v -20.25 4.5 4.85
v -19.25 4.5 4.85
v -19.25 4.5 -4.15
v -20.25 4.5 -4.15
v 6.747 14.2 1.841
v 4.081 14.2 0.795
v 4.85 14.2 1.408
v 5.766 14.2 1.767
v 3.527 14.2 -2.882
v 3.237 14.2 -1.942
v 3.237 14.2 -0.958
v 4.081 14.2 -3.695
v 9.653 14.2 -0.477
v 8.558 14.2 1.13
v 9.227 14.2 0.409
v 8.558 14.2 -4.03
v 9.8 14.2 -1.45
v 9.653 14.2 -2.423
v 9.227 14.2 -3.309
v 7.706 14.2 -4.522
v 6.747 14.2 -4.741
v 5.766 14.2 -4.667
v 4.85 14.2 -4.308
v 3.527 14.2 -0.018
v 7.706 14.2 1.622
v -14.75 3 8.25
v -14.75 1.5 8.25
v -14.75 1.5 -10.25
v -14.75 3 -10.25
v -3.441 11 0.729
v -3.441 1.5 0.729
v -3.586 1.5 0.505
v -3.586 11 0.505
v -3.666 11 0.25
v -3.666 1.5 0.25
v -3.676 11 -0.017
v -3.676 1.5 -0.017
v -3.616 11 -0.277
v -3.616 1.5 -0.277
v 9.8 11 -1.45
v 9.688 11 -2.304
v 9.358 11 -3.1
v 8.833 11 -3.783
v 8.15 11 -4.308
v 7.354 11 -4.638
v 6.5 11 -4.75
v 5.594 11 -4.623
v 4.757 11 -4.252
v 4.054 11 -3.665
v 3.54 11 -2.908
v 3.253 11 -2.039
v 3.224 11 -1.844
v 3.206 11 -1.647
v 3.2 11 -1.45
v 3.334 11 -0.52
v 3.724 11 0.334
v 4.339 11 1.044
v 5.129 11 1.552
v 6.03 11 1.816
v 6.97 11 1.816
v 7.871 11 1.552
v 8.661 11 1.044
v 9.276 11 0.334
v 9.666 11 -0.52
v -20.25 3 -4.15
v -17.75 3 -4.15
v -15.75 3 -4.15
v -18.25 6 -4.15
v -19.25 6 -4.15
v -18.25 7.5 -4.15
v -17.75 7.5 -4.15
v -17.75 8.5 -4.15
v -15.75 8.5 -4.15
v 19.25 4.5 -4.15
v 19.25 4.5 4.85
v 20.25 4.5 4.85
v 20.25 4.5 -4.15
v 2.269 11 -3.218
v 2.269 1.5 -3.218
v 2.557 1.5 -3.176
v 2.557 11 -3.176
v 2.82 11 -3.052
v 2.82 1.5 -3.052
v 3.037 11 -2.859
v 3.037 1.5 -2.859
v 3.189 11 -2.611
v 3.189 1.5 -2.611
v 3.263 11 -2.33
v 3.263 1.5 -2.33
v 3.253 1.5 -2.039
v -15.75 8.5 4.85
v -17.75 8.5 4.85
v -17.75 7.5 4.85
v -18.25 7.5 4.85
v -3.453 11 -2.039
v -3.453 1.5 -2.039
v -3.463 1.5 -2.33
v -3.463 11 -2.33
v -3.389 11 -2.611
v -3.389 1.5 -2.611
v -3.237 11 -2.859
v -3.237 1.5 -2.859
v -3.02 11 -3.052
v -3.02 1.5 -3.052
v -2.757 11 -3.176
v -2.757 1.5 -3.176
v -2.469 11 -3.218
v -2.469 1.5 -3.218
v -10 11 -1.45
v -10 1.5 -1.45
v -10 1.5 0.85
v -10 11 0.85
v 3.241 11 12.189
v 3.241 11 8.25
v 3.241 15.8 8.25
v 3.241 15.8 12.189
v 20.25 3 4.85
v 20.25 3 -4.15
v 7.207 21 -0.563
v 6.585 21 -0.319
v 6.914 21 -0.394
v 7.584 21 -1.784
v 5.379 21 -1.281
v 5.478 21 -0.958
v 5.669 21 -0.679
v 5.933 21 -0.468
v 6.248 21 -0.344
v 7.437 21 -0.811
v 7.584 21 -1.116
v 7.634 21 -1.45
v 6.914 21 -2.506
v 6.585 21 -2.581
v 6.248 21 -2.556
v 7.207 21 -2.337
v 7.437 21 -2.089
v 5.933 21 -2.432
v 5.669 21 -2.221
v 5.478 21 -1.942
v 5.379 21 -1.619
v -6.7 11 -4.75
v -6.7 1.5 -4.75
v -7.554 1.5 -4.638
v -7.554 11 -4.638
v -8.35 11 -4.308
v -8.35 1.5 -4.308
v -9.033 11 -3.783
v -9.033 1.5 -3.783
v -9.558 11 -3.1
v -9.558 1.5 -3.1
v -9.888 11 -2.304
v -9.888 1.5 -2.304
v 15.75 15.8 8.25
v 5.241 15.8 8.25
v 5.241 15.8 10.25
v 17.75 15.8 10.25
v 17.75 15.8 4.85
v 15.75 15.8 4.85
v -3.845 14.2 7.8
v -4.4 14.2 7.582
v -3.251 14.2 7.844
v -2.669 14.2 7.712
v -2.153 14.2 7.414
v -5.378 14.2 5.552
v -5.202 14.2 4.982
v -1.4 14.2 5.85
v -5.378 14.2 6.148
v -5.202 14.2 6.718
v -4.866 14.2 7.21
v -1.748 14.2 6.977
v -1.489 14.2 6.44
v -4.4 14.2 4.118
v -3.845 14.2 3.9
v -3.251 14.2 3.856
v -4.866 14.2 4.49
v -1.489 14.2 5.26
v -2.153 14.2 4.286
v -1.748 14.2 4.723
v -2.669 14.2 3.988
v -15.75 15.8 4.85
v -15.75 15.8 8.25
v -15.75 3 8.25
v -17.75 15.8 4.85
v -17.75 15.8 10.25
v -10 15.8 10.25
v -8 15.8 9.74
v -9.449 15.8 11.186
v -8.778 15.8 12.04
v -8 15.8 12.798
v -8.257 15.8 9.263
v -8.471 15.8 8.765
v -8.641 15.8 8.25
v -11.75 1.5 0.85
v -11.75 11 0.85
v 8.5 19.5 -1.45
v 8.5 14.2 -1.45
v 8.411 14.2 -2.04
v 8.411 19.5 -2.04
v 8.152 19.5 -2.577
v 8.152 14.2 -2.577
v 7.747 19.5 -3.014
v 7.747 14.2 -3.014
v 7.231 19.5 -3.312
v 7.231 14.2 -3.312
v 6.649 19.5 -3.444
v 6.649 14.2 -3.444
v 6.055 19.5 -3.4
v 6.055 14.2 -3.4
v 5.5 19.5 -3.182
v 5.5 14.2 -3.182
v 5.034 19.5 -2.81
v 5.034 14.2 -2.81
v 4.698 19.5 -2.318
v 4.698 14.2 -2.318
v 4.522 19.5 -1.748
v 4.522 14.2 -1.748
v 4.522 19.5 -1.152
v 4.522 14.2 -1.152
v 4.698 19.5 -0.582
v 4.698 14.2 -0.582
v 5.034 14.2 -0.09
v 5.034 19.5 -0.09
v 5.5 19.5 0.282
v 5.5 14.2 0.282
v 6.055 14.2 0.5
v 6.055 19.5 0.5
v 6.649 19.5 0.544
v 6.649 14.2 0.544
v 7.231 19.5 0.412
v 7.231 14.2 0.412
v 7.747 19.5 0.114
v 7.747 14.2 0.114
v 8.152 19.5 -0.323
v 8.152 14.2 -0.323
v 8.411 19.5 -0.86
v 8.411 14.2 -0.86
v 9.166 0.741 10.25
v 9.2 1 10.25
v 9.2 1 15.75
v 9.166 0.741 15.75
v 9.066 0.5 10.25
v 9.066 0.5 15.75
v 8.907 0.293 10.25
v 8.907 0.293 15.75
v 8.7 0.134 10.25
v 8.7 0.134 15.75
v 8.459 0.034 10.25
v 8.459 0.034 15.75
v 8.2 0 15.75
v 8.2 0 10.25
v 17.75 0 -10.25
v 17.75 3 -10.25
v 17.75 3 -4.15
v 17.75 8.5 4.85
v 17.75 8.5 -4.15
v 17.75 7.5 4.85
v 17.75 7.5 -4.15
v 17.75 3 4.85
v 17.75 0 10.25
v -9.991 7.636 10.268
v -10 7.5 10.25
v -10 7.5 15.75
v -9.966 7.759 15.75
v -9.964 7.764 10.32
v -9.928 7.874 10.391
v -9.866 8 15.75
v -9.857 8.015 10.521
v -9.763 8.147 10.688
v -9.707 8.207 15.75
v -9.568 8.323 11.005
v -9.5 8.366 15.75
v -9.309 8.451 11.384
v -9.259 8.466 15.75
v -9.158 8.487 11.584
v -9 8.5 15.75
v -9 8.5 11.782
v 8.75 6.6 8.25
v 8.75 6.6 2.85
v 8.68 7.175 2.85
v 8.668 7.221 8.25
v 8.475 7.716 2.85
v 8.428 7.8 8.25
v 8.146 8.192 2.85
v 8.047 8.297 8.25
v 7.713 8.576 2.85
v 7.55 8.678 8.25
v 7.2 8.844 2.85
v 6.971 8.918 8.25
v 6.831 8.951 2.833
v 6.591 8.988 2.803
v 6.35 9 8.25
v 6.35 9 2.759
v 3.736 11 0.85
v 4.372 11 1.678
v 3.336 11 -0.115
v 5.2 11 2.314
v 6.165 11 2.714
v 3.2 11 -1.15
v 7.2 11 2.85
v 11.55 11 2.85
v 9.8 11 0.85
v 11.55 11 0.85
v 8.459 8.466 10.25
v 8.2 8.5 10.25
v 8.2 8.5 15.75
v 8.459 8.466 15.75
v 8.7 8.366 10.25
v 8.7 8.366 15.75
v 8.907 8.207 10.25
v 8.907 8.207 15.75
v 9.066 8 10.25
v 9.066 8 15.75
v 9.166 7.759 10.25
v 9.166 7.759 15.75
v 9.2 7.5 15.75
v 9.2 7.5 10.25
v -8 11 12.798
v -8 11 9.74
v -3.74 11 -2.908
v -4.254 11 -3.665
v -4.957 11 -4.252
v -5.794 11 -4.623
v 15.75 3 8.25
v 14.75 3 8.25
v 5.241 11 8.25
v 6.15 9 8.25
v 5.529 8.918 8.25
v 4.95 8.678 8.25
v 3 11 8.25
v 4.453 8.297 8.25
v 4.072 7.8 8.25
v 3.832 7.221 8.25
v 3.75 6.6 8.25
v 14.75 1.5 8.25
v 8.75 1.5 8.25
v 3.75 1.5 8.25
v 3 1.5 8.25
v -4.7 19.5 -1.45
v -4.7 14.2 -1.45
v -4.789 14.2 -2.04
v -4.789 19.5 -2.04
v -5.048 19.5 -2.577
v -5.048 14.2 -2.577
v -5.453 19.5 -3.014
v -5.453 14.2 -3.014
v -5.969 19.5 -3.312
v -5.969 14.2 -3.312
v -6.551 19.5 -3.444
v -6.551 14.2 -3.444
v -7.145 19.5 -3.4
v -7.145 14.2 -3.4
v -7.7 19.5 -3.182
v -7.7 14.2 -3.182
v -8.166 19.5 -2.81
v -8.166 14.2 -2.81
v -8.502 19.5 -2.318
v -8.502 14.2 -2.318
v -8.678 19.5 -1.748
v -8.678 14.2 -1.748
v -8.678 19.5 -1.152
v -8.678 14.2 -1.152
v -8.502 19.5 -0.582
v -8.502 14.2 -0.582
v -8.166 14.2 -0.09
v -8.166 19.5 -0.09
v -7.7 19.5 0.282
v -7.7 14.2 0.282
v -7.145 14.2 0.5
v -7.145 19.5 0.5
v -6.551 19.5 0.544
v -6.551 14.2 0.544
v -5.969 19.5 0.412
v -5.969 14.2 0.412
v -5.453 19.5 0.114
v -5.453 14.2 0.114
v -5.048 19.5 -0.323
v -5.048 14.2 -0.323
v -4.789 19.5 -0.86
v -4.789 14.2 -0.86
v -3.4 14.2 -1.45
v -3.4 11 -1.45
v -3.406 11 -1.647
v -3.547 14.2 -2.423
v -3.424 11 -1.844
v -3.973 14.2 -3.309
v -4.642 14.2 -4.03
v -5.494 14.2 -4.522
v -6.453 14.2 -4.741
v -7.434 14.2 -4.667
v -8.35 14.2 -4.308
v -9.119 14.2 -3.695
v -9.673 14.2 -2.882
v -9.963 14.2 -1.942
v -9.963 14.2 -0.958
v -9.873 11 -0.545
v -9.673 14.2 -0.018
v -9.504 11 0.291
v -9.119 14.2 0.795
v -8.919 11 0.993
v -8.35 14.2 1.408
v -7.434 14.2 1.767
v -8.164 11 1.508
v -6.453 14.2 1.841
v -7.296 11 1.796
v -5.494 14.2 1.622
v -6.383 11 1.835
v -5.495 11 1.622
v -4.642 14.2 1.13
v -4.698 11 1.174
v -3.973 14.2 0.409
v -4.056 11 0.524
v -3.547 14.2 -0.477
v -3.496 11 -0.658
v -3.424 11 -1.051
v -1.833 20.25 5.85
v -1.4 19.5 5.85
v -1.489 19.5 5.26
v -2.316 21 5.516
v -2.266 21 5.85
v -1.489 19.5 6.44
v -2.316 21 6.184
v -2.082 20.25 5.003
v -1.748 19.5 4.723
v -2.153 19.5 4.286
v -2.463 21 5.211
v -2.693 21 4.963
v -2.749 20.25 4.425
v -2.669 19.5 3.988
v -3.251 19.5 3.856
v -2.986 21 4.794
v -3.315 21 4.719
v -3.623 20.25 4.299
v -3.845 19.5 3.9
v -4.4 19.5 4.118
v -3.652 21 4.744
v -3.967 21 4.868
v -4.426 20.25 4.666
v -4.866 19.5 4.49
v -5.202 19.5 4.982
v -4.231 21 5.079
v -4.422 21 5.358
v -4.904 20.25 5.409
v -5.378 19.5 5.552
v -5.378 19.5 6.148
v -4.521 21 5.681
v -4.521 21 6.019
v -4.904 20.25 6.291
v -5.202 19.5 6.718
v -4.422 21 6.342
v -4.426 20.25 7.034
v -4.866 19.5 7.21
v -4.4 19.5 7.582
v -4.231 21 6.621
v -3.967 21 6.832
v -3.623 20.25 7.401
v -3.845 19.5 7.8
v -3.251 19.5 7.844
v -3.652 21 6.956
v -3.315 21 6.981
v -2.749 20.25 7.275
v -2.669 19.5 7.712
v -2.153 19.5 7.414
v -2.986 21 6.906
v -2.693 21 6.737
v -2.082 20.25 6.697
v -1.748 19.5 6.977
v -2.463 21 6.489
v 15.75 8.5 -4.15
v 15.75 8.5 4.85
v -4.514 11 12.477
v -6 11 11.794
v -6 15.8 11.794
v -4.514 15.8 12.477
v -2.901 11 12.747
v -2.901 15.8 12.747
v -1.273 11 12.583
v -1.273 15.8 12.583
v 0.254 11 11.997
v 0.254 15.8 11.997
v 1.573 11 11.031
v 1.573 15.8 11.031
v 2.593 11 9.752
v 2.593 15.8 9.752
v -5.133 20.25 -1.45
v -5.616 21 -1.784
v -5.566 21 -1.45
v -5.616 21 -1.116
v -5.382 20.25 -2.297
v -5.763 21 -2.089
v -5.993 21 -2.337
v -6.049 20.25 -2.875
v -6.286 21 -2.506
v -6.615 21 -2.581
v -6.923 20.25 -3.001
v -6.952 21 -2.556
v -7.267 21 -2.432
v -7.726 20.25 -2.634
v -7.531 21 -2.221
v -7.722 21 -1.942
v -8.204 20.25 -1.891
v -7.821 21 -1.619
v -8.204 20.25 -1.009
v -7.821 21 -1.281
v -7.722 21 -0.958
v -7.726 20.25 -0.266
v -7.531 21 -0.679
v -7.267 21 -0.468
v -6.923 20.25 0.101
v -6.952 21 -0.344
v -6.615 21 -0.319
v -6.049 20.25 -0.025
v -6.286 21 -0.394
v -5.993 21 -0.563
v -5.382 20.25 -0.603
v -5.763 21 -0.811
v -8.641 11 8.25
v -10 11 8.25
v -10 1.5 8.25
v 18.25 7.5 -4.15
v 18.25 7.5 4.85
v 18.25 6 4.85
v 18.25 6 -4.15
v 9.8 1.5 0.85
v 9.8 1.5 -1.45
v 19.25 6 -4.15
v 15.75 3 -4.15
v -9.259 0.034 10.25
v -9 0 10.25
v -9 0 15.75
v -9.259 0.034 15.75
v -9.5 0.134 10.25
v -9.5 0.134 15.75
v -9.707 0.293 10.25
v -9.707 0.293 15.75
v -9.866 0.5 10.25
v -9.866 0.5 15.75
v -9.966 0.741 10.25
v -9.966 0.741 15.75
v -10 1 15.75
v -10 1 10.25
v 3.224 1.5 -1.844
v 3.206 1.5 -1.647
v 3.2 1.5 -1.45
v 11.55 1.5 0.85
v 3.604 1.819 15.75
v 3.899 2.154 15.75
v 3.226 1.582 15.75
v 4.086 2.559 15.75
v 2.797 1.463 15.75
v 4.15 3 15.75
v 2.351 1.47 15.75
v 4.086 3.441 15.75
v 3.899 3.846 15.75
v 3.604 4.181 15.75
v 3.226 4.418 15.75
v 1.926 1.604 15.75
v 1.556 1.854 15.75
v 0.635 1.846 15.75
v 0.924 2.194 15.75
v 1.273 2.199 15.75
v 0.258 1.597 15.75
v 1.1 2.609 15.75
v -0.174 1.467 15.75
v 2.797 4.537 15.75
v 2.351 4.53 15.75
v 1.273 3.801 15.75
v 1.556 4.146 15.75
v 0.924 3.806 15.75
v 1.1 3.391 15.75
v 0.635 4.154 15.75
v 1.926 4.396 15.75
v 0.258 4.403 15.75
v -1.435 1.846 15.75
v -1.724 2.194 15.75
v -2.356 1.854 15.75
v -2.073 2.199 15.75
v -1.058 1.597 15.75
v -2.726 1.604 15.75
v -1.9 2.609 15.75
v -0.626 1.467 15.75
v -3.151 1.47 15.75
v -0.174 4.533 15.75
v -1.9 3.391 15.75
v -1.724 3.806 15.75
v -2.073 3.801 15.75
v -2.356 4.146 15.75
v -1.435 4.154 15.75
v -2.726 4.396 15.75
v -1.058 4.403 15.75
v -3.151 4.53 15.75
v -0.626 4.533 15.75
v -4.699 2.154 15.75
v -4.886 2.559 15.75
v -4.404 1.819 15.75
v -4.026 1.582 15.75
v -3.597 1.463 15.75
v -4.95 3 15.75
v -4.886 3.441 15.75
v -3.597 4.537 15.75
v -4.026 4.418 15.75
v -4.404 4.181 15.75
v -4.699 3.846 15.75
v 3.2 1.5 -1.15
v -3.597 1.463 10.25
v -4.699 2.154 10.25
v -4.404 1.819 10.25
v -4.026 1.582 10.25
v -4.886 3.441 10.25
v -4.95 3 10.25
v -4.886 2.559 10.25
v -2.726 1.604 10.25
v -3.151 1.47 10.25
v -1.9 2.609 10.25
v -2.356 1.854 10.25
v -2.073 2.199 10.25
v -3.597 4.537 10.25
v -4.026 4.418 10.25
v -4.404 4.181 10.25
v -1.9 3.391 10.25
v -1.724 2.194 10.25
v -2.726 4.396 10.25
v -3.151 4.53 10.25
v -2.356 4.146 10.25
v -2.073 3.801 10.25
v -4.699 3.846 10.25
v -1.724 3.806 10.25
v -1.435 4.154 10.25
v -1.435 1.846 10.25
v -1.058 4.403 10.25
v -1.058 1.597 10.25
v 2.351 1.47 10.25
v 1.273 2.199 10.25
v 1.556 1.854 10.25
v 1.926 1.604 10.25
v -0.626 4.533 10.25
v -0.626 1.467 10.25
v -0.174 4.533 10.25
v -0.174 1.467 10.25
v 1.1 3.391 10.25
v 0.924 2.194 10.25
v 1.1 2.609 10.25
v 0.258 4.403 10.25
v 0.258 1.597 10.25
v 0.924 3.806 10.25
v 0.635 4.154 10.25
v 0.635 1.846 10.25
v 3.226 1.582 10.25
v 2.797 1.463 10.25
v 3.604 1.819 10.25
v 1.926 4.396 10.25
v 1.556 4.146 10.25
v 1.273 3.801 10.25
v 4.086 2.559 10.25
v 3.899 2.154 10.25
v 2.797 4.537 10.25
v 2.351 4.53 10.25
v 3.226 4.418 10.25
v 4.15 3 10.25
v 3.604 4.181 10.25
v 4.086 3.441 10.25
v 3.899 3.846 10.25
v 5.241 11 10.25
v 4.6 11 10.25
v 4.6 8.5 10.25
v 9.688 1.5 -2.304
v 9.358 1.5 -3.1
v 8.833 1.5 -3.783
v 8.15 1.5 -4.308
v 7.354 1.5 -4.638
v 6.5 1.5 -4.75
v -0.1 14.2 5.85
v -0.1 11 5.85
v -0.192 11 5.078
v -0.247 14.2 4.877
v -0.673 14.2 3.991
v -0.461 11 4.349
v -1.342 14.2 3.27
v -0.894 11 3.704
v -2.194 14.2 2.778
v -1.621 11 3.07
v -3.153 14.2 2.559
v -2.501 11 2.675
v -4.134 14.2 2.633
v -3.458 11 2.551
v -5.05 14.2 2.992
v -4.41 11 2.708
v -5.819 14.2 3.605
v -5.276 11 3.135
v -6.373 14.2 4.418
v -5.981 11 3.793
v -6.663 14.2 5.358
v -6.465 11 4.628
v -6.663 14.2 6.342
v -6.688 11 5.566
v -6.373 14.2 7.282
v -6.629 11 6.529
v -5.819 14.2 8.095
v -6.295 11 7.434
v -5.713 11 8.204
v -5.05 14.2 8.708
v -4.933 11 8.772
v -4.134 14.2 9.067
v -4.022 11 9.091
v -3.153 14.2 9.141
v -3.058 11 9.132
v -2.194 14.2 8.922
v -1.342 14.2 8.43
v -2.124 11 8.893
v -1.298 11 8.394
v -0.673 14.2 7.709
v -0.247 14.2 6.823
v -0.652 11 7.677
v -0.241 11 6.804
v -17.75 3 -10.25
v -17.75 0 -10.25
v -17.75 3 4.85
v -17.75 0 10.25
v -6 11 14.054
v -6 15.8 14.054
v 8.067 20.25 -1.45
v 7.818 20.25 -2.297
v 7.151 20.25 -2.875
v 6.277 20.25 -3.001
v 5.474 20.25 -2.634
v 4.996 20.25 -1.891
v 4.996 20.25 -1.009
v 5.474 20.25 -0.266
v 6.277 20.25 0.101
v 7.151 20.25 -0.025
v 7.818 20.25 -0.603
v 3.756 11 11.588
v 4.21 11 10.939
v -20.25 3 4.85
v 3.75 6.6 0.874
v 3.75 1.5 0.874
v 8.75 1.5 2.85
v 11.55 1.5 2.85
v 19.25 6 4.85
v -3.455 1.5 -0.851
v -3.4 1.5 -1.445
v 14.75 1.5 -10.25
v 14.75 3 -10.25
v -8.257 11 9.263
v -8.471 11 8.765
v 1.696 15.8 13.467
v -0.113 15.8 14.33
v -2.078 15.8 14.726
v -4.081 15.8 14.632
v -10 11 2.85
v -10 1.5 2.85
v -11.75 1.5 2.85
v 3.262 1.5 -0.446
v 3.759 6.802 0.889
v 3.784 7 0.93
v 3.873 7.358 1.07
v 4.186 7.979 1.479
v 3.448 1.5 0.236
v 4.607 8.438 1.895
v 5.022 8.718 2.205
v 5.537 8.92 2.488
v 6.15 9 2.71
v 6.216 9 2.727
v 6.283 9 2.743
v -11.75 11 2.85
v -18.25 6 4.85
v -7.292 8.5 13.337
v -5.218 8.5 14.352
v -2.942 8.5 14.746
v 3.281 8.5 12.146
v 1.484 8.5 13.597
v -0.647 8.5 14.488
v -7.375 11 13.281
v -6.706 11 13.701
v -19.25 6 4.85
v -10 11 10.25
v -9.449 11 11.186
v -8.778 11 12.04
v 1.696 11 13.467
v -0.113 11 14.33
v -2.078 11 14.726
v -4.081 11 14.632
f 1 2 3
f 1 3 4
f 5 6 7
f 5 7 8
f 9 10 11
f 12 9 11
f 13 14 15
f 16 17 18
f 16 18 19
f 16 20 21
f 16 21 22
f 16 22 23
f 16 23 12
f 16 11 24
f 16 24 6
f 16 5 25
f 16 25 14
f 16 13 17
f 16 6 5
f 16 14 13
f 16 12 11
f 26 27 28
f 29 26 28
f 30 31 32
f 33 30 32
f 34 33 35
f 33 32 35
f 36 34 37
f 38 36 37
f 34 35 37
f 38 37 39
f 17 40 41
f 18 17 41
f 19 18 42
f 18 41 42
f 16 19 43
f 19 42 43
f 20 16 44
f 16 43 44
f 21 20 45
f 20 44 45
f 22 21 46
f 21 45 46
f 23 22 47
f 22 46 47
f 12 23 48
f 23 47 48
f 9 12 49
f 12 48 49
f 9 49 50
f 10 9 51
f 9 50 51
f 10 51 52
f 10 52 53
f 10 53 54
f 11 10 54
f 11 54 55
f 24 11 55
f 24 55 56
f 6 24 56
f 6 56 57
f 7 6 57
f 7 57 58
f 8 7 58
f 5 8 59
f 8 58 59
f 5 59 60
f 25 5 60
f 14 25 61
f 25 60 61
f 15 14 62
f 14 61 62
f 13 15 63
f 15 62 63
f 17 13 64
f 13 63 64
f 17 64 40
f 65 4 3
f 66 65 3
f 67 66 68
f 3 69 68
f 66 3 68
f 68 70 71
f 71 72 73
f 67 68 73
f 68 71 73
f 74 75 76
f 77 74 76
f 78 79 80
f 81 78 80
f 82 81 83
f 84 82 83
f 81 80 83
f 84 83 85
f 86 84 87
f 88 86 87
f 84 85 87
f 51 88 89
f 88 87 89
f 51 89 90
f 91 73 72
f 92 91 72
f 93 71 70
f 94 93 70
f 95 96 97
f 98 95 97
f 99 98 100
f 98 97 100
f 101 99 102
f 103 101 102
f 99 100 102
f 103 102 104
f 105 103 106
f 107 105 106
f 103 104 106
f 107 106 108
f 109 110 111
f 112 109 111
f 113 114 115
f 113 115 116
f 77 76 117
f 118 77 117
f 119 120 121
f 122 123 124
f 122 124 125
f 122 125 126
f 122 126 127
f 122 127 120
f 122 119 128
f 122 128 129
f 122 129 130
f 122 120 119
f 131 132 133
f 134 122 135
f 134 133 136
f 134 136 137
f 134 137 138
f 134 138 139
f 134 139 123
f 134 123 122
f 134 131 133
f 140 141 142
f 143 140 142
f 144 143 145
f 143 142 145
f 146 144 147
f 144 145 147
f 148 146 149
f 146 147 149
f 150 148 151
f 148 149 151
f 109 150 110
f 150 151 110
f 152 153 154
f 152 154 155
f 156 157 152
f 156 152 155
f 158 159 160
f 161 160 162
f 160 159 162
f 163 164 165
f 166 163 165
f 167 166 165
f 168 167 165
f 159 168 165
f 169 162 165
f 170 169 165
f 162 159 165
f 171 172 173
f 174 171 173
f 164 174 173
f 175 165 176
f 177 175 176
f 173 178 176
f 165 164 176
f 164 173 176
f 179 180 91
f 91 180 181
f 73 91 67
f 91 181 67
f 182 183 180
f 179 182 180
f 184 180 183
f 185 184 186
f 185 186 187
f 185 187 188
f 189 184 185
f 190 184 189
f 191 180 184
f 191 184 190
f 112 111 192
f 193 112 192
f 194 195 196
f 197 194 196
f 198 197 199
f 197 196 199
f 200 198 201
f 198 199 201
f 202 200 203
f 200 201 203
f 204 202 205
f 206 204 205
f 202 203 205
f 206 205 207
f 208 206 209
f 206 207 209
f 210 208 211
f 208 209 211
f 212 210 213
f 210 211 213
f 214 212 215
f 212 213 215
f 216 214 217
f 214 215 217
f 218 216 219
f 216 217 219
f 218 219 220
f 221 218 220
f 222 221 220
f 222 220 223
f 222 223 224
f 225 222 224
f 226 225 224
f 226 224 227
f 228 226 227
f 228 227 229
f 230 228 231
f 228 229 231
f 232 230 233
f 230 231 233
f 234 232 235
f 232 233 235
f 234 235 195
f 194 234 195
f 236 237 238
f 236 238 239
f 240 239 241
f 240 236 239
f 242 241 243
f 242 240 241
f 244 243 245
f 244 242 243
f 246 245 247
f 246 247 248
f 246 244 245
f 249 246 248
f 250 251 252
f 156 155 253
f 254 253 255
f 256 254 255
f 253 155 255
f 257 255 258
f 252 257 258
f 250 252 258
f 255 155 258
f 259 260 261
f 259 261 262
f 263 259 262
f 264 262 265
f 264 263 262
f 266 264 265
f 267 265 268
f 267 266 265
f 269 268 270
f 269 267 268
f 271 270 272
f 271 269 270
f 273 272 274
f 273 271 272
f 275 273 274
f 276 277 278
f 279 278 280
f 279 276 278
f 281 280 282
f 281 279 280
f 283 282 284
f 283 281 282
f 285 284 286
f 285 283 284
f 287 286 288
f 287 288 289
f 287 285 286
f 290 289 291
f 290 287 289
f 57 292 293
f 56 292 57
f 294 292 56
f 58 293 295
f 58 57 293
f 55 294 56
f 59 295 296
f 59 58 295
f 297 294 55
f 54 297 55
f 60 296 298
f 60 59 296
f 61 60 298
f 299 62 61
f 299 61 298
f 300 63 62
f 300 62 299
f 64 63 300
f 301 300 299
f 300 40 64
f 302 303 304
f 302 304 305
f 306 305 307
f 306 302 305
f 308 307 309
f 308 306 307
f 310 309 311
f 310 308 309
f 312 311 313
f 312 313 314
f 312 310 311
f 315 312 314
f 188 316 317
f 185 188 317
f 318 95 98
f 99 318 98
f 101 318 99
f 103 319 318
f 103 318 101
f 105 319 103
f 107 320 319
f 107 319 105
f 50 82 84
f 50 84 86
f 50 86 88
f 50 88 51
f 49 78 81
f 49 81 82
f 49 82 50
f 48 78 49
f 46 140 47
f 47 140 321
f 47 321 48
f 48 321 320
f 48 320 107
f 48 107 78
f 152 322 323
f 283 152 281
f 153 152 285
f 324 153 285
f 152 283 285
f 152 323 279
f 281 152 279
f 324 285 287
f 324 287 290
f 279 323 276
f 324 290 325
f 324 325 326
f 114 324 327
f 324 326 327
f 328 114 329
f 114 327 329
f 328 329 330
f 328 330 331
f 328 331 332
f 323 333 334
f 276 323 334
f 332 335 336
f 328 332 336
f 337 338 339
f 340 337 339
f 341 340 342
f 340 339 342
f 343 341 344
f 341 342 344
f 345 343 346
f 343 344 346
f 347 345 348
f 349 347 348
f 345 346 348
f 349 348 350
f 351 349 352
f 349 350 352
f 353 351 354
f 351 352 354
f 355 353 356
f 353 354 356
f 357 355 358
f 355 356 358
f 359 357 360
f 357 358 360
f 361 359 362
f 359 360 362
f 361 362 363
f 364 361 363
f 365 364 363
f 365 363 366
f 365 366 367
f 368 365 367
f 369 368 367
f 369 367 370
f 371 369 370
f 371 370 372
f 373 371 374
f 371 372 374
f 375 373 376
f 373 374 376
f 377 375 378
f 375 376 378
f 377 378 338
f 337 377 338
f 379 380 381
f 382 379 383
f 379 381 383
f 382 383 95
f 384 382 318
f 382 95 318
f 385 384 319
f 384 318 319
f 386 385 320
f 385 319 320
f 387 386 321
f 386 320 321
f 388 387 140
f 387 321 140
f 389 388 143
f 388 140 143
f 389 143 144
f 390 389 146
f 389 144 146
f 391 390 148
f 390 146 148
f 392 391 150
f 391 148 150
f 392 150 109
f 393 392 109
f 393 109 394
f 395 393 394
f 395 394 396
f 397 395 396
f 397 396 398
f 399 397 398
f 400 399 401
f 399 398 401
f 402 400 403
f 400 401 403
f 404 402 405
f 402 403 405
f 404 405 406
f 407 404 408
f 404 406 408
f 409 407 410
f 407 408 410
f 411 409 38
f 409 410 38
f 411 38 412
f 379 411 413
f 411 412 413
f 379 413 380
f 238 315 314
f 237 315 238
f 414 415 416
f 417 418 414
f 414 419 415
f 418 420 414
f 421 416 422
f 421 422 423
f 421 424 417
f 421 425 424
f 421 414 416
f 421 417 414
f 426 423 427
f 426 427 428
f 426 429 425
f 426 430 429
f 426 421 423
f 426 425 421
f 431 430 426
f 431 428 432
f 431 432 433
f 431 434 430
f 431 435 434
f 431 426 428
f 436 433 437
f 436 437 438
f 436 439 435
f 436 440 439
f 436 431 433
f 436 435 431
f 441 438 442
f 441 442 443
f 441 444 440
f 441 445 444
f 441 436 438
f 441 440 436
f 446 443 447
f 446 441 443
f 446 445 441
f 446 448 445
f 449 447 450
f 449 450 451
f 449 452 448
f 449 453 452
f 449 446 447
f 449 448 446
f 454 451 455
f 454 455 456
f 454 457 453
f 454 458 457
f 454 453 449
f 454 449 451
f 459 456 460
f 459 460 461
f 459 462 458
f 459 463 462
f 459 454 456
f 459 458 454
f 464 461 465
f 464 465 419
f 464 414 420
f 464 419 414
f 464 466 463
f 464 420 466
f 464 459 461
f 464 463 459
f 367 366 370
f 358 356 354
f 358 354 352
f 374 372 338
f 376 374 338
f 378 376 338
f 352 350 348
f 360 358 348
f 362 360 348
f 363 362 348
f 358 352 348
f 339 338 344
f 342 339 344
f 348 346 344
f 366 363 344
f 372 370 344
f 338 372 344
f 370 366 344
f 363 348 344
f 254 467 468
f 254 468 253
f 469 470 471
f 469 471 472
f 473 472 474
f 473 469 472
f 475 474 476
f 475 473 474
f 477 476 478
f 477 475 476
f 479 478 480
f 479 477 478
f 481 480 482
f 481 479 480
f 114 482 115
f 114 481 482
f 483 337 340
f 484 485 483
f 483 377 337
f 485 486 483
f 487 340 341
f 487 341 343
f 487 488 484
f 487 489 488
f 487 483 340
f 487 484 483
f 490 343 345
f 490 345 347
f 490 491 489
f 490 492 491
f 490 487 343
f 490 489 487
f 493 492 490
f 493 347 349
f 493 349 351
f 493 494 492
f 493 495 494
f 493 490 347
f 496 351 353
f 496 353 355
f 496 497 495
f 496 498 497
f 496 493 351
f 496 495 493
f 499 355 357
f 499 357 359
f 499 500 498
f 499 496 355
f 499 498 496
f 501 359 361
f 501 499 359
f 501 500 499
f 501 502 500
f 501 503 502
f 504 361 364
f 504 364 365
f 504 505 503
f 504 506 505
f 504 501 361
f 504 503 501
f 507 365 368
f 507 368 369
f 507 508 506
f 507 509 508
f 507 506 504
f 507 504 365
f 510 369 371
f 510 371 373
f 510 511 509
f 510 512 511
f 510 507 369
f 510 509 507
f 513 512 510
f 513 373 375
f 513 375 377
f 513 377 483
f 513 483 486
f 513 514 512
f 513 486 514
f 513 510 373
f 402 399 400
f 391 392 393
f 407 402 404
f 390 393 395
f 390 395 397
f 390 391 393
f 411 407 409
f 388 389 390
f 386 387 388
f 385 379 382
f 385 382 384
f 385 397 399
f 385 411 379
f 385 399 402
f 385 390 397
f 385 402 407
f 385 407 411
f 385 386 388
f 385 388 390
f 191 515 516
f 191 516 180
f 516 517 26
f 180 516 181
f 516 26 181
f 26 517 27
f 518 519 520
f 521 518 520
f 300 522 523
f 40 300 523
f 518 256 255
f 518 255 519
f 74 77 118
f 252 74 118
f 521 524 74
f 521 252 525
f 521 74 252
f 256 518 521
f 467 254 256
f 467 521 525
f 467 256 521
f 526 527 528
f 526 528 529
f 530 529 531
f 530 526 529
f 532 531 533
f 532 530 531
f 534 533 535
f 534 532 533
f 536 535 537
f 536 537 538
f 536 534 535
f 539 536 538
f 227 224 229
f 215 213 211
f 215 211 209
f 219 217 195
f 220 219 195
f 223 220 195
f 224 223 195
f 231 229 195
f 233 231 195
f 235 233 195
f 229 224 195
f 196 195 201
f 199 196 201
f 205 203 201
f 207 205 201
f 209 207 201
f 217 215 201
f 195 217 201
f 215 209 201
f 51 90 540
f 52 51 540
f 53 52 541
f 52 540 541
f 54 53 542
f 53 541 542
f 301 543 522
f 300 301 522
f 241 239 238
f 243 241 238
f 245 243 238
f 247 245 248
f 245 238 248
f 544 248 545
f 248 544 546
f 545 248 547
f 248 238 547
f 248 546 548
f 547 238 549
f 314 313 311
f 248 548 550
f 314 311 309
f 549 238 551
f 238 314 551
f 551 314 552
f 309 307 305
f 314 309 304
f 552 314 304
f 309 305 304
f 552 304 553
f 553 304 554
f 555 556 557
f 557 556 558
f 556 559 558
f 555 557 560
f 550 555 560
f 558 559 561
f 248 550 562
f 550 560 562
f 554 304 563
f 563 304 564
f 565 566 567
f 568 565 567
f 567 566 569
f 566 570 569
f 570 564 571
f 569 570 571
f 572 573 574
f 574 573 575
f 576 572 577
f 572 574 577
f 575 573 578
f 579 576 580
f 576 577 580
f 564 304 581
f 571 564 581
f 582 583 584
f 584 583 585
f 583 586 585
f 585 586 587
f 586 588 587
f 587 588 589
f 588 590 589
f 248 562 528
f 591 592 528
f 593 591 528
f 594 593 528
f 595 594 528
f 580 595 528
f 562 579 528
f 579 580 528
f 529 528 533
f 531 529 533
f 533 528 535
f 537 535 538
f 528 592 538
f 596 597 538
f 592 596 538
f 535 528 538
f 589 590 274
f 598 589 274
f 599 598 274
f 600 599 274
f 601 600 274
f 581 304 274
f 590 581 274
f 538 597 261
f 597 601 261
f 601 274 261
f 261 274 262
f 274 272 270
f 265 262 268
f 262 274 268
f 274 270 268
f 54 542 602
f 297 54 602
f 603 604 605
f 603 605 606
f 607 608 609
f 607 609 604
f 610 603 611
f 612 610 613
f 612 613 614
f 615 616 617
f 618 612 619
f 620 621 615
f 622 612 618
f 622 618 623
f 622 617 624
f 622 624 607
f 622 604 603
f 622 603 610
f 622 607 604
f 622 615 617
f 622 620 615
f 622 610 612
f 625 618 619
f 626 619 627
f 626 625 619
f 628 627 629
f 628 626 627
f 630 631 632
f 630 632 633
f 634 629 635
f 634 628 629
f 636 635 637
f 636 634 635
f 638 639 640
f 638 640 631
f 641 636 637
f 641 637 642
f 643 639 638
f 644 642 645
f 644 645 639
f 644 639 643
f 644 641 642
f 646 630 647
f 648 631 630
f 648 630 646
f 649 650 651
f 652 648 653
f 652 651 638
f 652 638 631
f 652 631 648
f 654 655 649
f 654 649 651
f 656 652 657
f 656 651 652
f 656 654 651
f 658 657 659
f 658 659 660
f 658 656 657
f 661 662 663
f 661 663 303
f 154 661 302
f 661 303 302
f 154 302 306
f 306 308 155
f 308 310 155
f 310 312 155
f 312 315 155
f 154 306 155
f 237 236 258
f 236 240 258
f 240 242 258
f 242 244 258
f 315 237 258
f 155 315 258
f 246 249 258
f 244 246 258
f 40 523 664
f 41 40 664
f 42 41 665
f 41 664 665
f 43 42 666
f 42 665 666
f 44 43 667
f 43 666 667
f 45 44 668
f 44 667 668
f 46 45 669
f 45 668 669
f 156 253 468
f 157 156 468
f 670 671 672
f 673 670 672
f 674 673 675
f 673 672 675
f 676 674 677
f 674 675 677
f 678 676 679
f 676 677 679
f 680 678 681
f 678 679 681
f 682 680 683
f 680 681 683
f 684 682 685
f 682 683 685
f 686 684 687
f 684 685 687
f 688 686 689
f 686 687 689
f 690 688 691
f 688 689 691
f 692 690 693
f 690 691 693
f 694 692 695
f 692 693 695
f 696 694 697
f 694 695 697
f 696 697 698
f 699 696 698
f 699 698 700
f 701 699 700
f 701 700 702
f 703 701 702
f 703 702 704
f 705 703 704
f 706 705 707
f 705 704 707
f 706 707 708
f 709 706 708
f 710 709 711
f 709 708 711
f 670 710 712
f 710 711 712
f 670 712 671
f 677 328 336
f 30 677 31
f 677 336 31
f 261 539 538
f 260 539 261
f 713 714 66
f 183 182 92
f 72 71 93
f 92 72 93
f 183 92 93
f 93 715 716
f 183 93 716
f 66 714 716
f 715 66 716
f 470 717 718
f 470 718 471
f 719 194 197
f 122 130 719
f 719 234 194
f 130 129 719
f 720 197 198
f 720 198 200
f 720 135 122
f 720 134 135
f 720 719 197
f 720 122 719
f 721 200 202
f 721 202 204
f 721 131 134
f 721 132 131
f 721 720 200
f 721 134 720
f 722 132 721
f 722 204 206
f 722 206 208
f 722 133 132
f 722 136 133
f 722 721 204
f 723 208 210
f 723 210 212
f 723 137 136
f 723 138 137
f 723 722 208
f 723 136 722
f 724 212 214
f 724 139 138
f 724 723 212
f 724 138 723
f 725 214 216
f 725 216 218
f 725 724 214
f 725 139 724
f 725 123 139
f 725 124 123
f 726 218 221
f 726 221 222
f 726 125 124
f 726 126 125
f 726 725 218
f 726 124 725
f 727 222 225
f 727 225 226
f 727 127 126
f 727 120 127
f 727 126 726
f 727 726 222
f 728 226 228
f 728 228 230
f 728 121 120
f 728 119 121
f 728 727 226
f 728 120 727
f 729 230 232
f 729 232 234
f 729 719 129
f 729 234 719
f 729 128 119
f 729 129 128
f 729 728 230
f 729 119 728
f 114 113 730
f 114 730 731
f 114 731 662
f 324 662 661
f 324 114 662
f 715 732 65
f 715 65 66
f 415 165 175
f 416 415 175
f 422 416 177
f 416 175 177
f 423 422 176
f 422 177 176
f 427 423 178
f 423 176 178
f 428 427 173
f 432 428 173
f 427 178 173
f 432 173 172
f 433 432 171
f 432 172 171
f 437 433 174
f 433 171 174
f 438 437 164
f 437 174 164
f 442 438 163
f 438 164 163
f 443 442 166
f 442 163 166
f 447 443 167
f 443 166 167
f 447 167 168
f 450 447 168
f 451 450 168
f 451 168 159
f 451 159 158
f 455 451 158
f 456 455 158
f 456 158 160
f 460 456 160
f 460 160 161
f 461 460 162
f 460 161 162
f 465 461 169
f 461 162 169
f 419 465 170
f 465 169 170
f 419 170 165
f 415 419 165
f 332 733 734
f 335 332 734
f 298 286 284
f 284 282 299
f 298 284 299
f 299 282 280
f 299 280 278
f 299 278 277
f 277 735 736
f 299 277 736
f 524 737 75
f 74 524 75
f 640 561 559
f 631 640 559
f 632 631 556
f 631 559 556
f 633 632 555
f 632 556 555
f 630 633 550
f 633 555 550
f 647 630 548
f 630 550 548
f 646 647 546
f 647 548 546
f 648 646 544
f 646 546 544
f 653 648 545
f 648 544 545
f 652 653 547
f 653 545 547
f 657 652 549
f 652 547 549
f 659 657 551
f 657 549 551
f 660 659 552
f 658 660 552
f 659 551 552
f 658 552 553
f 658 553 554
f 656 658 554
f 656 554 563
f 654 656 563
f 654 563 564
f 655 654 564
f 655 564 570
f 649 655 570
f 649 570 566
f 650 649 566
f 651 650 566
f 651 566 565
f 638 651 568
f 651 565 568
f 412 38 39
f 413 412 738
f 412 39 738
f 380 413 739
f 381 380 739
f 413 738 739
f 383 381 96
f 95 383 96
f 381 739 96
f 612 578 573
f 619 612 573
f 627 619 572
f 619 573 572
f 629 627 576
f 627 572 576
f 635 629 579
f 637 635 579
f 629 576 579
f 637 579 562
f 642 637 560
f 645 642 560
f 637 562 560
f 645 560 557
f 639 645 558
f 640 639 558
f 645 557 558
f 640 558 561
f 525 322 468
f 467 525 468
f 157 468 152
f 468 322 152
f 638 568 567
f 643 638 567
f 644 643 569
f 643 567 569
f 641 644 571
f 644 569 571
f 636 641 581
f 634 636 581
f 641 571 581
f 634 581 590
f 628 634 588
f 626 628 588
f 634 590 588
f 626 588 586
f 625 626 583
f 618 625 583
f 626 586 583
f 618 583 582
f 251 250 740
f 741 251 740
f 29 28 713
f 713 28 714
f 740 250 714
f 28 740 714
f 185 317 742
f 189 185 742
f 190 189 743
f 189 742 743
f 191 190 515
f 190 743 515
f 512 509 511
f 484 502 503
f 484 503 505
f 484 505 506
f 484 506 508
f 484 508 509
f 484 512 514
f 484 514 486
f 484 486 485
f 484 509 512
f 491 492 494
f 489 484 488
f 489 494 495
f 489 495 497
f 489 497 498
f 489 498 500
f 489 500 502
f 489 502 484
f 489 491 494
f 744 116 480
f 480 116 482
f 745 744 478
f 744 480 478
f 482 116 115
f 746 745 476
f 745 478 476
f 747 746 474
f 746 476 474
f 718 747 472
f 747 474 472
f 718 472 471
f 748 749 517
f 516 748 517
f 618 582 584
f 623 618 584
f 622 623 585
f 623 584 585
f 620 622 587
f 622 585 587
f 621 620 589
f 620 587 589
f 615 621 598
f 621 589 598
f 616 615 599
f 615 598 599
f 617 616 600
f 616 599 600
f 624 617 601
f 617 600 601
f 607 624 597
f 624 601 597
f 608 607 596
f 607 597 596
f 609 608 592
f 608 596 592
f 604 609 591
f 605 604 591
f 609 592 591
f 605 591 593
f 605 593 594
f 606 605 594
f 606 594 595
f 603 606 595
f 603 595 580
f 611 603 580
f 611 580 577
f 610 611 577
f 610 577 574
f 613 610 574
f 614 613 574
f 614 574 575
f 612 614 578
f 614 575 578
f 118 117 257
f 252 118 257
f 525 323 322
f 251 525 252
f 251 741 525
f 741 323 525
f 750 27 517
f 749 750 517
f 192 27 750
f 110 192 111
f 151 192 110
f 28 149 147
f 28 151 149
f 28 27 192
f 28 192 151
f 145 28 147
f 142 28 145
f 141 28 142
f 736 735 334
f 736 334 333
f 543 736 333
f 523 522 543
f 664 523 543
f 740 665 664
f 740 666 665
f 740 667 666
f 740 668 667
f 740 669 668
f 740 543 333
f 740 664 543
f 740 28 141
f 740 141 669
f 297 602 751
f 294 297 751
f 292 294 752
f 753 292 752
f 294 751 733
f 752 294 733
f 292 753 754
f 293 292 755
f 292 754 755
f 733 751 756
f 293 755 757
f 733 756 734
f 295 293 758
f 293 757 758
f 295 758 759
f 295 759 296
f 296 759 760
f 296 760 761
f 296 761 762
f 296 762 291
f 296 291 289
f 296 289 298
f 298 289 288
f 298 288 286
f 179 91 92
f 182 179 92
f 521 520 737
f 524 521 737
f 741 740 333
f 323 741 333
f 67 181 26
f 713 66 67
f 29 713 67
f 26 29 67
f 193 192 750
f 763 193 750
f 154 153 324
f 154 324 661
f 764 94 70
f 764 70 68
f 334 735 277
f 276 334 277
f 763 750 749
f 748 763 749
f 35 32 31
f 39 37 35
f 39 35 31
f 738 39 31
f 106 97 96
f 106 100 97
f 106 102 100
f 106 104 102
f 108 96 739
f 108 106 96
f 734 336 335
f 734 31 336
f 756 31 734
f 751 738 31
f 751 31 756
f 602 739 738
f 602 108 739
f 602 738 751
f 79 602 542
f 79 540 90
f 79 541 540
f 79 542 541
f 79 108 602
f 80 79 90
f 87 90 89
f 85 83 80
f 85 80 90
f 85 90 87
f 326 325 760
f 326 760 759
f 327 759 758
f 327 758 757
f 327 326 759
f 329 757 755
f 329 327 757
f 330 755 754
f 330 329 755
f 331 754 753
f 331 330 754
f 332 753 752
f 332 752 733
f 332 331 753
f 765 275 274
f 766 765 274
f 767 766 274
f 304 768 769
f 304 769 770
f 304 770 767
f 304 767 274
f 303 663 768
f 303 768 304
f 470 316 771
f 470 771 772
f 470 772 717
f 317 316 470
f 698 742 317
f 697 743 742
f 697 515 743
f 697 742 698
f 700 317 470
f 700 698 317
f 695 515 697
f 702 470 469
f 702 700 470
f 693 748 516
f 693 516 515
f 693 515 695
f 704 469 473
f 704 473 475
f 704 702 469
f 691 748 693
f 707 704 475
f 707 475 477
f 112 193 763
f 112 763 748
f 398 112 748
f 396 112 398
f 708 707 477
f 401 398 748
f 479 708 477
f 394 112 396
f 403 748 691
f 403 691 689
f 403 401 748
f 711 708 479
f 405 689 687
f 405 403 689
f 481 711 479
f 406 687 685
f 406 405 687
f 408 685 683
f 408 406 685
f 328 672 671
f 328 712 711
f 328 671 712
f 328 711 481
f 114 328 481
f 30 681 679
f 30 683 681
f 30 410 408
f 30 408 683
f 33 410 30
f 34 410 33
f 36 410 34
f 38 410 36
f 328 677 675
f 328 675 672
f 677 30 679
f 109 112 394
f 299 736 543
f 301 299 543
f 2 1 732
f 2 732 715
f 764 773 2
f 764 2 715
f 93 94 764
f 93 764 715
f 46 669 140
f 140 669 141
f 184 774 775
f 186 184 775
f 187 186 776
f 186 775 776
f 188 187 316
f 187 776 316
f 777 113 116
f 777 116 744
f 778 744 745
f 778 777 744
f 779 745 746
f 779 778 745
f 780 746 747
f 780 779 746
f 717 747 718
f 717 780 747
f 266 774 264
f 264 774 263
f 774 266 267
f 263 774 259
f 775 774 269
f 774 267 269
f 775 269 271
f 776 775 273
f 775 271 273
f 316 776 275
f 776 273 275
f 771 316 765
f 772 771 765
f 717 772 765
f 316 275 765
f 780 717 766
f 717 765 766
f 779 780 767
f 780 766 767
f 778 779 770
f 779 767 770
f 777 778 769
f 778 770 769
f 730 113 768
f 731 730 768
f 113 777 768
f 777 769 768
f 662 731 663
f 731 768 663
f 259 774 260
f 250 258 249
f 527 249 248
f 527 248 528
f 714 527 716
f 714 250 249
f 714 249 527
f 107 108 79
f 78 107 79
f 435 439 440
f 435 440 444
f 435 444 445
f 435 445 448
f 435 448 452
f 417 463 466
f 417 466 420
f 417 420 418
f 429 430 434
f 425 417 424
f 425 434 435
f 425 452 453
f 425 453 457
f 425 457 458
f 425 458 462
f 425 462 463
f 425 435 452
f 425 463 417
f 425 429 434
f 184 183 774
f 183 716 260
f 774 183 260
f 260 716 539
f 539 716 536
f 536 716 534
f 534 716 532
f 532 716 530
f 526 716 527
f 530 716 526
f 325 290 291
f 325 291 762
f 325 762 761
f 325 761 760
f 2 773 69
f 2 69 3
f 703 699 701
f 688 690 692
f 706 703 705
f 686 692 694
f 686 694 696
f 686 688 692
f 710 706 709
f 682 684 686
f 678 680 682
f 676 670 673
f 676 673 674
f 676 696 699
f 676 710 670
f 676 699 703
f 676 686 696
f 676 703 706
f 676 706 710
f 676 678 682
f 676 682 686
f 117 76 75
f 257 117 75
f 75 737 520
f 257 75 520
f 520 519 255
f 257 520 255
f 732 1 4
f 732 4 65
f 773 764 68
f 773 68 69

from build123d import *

# Parameters (mm, degrees)
SKETCH1_W             = 35.5
SKETCH1_H             = 20.5
BOSS_EXTRUDE1_DEPTH   = 1.5
BOSS_EXTRUDE2_DEPTH   = 1.5
BOSS_EXTRUDE4_DEPTH   = 9.5
SKETCH6_R             = 3.3
BOSS_EXTRUDE5_DEPTH   = 3.2
SKETCH7_R             = 2
BOSS_EXTRUDE6_DEPTH   = 6.8
BOSS_EXTRUDE6_2_DEPTH = 6.8
BOSS_EXTRUDE6_3_DEPTH = 6.8
CHAMFER1_SIZE         = 1.5
CHAMFER1_SIZE2        = 0.866025404
CHAMFER2_SIZE         = 1.5
CHAMFER2_SIZE2        = 0.866025404
CHAMFER3_SIZE         = 1.5
CHAMFER3_SIZE2        = 0.866025404
BOSS_EXTRUDE7_DEPTH   = 8
BOSS_EXTRUDE8_DEPTH   = 4.8
BOSS_EXTRUDE9_DEPTH   = 5.5
BOSS_EXTRUDE10_DEPTH  = 9
BOSS_EXTRUDE11_DEPTH  = 9
CUT_EXTRUDE4_DEPTH    = 5.5


with BuildPart() as part:
    # Sketch1 → Boss-Extrude1 (new body)
    with BuildSketch(Plane(origin=(0, 0, 0), x_dir=(1, 0, 0), z_dir=(0, 1, 0))):
        Rectangle(SKETCH1_W, SKETCH1_H)
    extrude(amount=BOSS_EXTRUDE1_DEPTH)

    # Sketch2 → Boss-Extrude2 (add)
    with BuildSketch(Plane(origin=(0, 1.5, 0), x_dir=(1, 0, 0), z_dir=(0, 1, 0))):
        Polygon((17.75, 10.25), (14.75, 10.25), (14.75, -8.25), (-14.75, -8.25), (-14.75, 10.25), (-17.75, 10.25), (-17.75, -10.25), (17.75, -10.25), align=None)
    extrude(amount=BOSS_EXTRUDE2_DEPTH)

    # Sketch4 → Boss-Extrude4 (add)
    with BuildSketch(Plane(origin=(0, 1.5, 0), x_dir=(1, 0, 0), z_dir=(0, 1, 0))):
        with BuildLine():
            ThreePointArc((9.8, 1.45), (8.833452378, 3.783452378), (6.5, 4.75))
            Line((6.5, 4.75), (-6.7, 4.75))
            ThreePointArc((-6.7, 4.75), (-9.033452378, 3.783452378), (-10, 1.45))
            Line((-10, 1.45), (-10, -0.85))
            Line((-10, -0.85), (-11.75, -0.85))
            Line((-11.75, -0.85), (-11.75, -2.85))
            Line((-11.75, -2.85), (-10, -2.85))
            Line((-10, -2.85), (-10, -8.25))
            Line((-10, -8.25), (3, -8.25))
            Line((3, -8.25), (-3.440516213, -0.729311618))
            ThreePointArc((-3.440516213, -0.729311618), (-3.666156861, -0.250346383), (-3.615628786, 0.276690914))
            ThreePointArc((-3.615628786, 0.276690914), (-3.413949819, 1.146892415), (-3.453044202, 2.03930302))
            ThreePointArc((-3.453044202, 2.03930302), (-3.236769385, 2.858747591), (-2.469118203, 3.217879692))
            Line((-2.469118203, 3.217879692), (2.269118203, 3.217879692))
            ThreePointArc((2.269118203, 3.217879692), (3.036769385, 2.858747591), (3.253044202, 2.03930302))
            ThreePointArc((3.253044202, 2.03930302), (3.213287803, 1.745842752), (3.2, 1.45))
            Line((3.2, 1.45), (3.2, 1.15))
            ThreePointArc((3.2, 1.15), (4.371572875, -1.678427125), (7.2, -2.85))
            Line((7.2, -2.85), (9.8, -2.85))
            Line((9.8, -2.85), (11.55, -2.85))
            Line((11.55, -2.85), (11.55, -0.85))
            Line((11.55, -0.85), (9.8, -0.85))
            Line((9.8, -0.85), (9.8, 1.45))
        make_face()
        with BuildLine():
            Line((3, -8.25), (-10, -8.25))
            Line((-10, -8.25), (-10, -10.25))
            ThreePointArc((-10, -10.25), (-2.7, -14.75), (4.6, -10.25))
            Line((4.6, -10.25), (4.6, -8.25))
            Line((4.6, -8.25), (3, -8.25))
        make_face()
    extrude(amount=BOSS_EXTRUDE4_DEPTH)

    # Sketch6 → Boss-Extrude5 (add)
    with BuildSketch(Plane(origin=(0, 11, 0), x_dir=(1, 0, 0), z_dir=(0, 1, 0))):
        with Locations((-6.7, 1.45)):
            Circle(SKETCH6_R)
        with Locations((6.5, 1.45)):
            Circle(SKETCH6_R)
        with Locations((-3.4, -5.85)):
            Circle(SKETCH6_R)
    extrude(amount=BOSS_EXTRUDE5_DEPTH)

    # Sketch8 → Boss-Extrude7 (add)
    with BuildSketch(Plane(origin=(0, 3, 0), x_dir=(1, 0, 0), z_dir=(0, 1, 0))):
        with BuildLine():
            Line((-17.75, -10.25), (-10, -10.25))
            ThreePointArc((-10, -10.25), (-2.7, -14.75), (4.6, -10.25))
            Line((4.6, -10.25), (17.75, -10.25))
            Line((17.75, -10.25), (17.75, -4.85))
            Line((17.75, -4.85), (15.75, -4.85))
            Line((15.75, -4.85), (15.75, -8.25))
            Line((15.75, -8.25), (14.75, -8.25))
            Line((14.75, -8.25), (4.6, -8.25))
            Line((4.6, -8.25), (3.240538696, -8.25))
            ThreePointArc((3.240538696, -8.25), (-2.7, -12.75), (-8.640538696, -8.25))
            Line((-8.640538696, -8.25), (-10, -8.25))
            Line((-10, -8.25), (-14.75, -8.25))
            Line((-14.75, -8.25), (-15.75, -8.25))
            Line((-15.75, -8.25), (-15.75, -4.85))
            Line((-15.75, -4.85), (-17.75, -4.85))
            Line((-17.75, -4.85), (-17.75, -10.25))
        make_face()
    extrude(amount=BOSS_EXTRUDE7_DEPTH)

    # Sketch9 → Boss-Extrude8 (add)
    with BuildSketch(Plane(origin=(0, 11, 0), x_dir=(1, 0, 0), z_dir=(0, 1, 0))):
        Polygon((17.75, -10.25), (17.75, -4.85), (15.75, -4.85), (15.75, -8.25), (5.240538696, -8.25), (5.240538696, -10.25), align=None)
        with BuildLine():
            Line((-17.75, -4.85), (-17.75, -10.25))
            Line((-17.75, -10.25), (-10, -10.25))
            ThreePointArc((-10, -10.25), (-9.127522593, -11.624085625), (-8, -12.797976988))
            Line((-8, -12.797976988), (-8, -9.739998243))
            ThreePointArc((-8, -9.739998243), (-8.369431297, -9.016133462), (-8.640538696, -8.25))
            Line((-8.640538696, -8.25), (-15.75, -8.25))
            Line((-15.75, -8.25), (-15.75, -4.85))
            Line((-15.75, -4.85), (-17.75, -4.85))
        make_face()
        with BuildLine():
            Line((3.240538696, -8.25), (3.240538696, -12.189330653))
            ThreePointArc((3.240538696, -12.189330653), (-1.083725026, -14.588552552), (-6, -14.05398466))
            Line((-6, -14.05398466), (-6, -11.793542506))
            ThreePointArc((-6, -11.793542506), (-0.490410779, -12.340861452), (3.240538696, -8.25))
        make_face()
    extrude(amount=BOSS_EXTRUDE8_DEPTH)

    # Sketch10 → Boss-Extrude9 (add)
    with BuildSketch(Plane.XY.offset(10.25)):
        with BuildLine():
            Line((-10, 1), (-10, 7.5))
            ThreePointArc((-10, 7.5), (-9.707106781, 8.207106781), (-9, 8.5))
            Line((-9, 8.5), (8.2, 8.5))
            ThreePointArc((8.2, 8.5), (8.907106781, 8.207106781), (9.2, 7.5))
            Line((9.2, 7.5), (9.2, 1))
            ThreePointArc((9.2, 1), (8.907106781, 0.292893219), (8.2, 0))
            Line((8.2, 0), (-9, 0))
            ThreePointArc((-9, 0), (-9.707106781, 0.292893219), (-10, 1))
        make_face()
    extrude(amount=BOSS_EXTRUDE9_DEPTH)

    # Sketch11 → Boss-Extrude10 (add)
    with BuildSketch(Plane(origin=(0, 0, 4.85), x_dir=(-1, 0, 0), z_dir=(0, 0, -1))):
        Polygon((-15.75, 8.5), (-17.75, 8.5), (-17.75, 7.5), (-18.25, 7.5), (-18.25, 6), (-19.25, 6), (-19.25, 4.5), (-20.25, 4.5), (-20.25, 3), (-15.75, 3), align=None)
        Polygon((20.25, 4.5), (20.25, 3), (15.75, 3), (15.75, 8.5), (17.75, 8.5), (17.75, 7.5), (18.25, 7.5), (18.25, 6), (19.25, 6), (19.25, 4.5), align=None)
    extrude(amount=BOSS_EXTRUDE10_DEPTH)

    # Sketch12 → Boss-Extrude11 (add)
    with BuildSketch(Plane(origin=(0, 0, 8.25), x_dir=(-1, 0, 0), z_dir=(0, 0, -1))):
        with BuildLine():
            Line((-8.75, 1.5), (-8.75, 6.6))
            ThreePointArc((-8.75, 6.6), (-8.047056275, 8.297056275), (-6.35, 9))
            Line((-6.35, 9), (-6.15, 9))
            ThreePointArc((-6.15, 9), (-4.452943725, 8.297056275), (-3.75, 6.6))
            Line((-3.75, 6.6), (-3.75, 1.5))
            Line((-3.75, 1.5), (-8.75, 1.5))
        make_face()
    extrude(amount=BOSS_EXTRUDE11_DEPTH)

    # Sketch13 → Cut-Extrude4 (cut)
    with BuildSketch(Plane.XY.offset(15.75)):
        with BuildLine():
            ThreePointArc((-1.9, 2.609487516), (-0.4, 1.45), (1.1, 2.609487516))
            ThreePointArc((1.1, 2.609487516), (4.15, 3), (1.1, 3.390512484))
            ThreePointArc((1.1, 3.390512484), (-0.4, 4.55), (-1.9, 3.390512484))
            ThreePointArc((-1.9, 3.390512484), (-4.95, 3), (-1.9, 2.609487516))
        make_face()
    extrude(amount=-CUT_EXTRUDE4_DEPTH, mode=Mode.SUBTRACT)


with BuildPart() as body_2:
    # Sketch7 → Boss-Extrude6 (new body)
    with BuildSketch(Plane(origin=(0, 14.2, 0), x_dir=(1, 0, 0), z_dir=(0, 1, 0))):
        with Locations((-6.7, 1.45)):
            Circle(SKETCH7_R)
    extrude(amount=BOSS_EXTRUDE6_DEPTH)

    # Chamfer3
    chamfer3_edges = [body_2.edges().sort_by_distance(p)[0] for p in [
        (-8.7, 21, -1.45),
    ]]
    chamfer3_side = [body_2.faces().sort_by_distance(p)[0] for p in [
        (-8.7, 17.6, -1.45),
    ]]
    chamfer(chamfer3_edges, length=CHAMFER3_SIZE, length2=CHAMFER3_SIZE2, reference=chamfer3_side[0])


with BuildPart() as body_3:
    # Sketch7 → Boss-Extrude6 2 (new body)
    with BuildSketch(Plane(origin=(0, 14.2, 0), x_dir=(1, 0, 0), z_dir=(0, 1, 0))):
        with Locations((-3.4, -5.85)):
            Circle(SKETCH7_R)
    extrude(amount=BOSS_EXTRUDE6_2_DEPTH)

    # Chamfer1
    chamfer1_edges = [body_3.edges().sort_by_distance(p)[0] for p in [
        (-5.4, 21, 5.85),
    ]]
    chamfer1_side = [body_3.faces().sort_by_distance(p)[0] for p in [
        (-5.4, 17.6, 5.85),
    ]]
    chamfer(chamfer1_edges, length=CHAMFER1_SIZE, length2=CHAMFER1_SIZE2, reference=chamfer1_side[0])


with BuildPart() as body_4:
    # Sketch7 → Boss-Extrude6 3 (new body)
    with BuildSketch(Plane(origin=(0, 14.2, 0), x_dir=(1, 0, 0), z_dir=(0, 1, 0))):
        with Locations((6.5, 1.45)):
            Circle(SKETCH7_R)
    extrude(amount=BOSS_EXTRUDE6_3_DEPTH)

    # Chamfer2
    chamfer2_edges = [body_4.edges().sort_by_distance(p)[0] for p in [
        (4.5, 21, -1.45),
    ]]
    chamfer2_side = [body_4.faces().sort_by_distance(p)[0] for p in [
        (4.5, 17.6, -1.45),
    ]]
    chamfer(chamfer2_edges, length=CHAMFER2_SIZE, length2=CHAMFER2_SIZE2, reference=chamfer2_side[0])


solid = Compound([part.part, body_2.part, body_3.part, body_4.part])
